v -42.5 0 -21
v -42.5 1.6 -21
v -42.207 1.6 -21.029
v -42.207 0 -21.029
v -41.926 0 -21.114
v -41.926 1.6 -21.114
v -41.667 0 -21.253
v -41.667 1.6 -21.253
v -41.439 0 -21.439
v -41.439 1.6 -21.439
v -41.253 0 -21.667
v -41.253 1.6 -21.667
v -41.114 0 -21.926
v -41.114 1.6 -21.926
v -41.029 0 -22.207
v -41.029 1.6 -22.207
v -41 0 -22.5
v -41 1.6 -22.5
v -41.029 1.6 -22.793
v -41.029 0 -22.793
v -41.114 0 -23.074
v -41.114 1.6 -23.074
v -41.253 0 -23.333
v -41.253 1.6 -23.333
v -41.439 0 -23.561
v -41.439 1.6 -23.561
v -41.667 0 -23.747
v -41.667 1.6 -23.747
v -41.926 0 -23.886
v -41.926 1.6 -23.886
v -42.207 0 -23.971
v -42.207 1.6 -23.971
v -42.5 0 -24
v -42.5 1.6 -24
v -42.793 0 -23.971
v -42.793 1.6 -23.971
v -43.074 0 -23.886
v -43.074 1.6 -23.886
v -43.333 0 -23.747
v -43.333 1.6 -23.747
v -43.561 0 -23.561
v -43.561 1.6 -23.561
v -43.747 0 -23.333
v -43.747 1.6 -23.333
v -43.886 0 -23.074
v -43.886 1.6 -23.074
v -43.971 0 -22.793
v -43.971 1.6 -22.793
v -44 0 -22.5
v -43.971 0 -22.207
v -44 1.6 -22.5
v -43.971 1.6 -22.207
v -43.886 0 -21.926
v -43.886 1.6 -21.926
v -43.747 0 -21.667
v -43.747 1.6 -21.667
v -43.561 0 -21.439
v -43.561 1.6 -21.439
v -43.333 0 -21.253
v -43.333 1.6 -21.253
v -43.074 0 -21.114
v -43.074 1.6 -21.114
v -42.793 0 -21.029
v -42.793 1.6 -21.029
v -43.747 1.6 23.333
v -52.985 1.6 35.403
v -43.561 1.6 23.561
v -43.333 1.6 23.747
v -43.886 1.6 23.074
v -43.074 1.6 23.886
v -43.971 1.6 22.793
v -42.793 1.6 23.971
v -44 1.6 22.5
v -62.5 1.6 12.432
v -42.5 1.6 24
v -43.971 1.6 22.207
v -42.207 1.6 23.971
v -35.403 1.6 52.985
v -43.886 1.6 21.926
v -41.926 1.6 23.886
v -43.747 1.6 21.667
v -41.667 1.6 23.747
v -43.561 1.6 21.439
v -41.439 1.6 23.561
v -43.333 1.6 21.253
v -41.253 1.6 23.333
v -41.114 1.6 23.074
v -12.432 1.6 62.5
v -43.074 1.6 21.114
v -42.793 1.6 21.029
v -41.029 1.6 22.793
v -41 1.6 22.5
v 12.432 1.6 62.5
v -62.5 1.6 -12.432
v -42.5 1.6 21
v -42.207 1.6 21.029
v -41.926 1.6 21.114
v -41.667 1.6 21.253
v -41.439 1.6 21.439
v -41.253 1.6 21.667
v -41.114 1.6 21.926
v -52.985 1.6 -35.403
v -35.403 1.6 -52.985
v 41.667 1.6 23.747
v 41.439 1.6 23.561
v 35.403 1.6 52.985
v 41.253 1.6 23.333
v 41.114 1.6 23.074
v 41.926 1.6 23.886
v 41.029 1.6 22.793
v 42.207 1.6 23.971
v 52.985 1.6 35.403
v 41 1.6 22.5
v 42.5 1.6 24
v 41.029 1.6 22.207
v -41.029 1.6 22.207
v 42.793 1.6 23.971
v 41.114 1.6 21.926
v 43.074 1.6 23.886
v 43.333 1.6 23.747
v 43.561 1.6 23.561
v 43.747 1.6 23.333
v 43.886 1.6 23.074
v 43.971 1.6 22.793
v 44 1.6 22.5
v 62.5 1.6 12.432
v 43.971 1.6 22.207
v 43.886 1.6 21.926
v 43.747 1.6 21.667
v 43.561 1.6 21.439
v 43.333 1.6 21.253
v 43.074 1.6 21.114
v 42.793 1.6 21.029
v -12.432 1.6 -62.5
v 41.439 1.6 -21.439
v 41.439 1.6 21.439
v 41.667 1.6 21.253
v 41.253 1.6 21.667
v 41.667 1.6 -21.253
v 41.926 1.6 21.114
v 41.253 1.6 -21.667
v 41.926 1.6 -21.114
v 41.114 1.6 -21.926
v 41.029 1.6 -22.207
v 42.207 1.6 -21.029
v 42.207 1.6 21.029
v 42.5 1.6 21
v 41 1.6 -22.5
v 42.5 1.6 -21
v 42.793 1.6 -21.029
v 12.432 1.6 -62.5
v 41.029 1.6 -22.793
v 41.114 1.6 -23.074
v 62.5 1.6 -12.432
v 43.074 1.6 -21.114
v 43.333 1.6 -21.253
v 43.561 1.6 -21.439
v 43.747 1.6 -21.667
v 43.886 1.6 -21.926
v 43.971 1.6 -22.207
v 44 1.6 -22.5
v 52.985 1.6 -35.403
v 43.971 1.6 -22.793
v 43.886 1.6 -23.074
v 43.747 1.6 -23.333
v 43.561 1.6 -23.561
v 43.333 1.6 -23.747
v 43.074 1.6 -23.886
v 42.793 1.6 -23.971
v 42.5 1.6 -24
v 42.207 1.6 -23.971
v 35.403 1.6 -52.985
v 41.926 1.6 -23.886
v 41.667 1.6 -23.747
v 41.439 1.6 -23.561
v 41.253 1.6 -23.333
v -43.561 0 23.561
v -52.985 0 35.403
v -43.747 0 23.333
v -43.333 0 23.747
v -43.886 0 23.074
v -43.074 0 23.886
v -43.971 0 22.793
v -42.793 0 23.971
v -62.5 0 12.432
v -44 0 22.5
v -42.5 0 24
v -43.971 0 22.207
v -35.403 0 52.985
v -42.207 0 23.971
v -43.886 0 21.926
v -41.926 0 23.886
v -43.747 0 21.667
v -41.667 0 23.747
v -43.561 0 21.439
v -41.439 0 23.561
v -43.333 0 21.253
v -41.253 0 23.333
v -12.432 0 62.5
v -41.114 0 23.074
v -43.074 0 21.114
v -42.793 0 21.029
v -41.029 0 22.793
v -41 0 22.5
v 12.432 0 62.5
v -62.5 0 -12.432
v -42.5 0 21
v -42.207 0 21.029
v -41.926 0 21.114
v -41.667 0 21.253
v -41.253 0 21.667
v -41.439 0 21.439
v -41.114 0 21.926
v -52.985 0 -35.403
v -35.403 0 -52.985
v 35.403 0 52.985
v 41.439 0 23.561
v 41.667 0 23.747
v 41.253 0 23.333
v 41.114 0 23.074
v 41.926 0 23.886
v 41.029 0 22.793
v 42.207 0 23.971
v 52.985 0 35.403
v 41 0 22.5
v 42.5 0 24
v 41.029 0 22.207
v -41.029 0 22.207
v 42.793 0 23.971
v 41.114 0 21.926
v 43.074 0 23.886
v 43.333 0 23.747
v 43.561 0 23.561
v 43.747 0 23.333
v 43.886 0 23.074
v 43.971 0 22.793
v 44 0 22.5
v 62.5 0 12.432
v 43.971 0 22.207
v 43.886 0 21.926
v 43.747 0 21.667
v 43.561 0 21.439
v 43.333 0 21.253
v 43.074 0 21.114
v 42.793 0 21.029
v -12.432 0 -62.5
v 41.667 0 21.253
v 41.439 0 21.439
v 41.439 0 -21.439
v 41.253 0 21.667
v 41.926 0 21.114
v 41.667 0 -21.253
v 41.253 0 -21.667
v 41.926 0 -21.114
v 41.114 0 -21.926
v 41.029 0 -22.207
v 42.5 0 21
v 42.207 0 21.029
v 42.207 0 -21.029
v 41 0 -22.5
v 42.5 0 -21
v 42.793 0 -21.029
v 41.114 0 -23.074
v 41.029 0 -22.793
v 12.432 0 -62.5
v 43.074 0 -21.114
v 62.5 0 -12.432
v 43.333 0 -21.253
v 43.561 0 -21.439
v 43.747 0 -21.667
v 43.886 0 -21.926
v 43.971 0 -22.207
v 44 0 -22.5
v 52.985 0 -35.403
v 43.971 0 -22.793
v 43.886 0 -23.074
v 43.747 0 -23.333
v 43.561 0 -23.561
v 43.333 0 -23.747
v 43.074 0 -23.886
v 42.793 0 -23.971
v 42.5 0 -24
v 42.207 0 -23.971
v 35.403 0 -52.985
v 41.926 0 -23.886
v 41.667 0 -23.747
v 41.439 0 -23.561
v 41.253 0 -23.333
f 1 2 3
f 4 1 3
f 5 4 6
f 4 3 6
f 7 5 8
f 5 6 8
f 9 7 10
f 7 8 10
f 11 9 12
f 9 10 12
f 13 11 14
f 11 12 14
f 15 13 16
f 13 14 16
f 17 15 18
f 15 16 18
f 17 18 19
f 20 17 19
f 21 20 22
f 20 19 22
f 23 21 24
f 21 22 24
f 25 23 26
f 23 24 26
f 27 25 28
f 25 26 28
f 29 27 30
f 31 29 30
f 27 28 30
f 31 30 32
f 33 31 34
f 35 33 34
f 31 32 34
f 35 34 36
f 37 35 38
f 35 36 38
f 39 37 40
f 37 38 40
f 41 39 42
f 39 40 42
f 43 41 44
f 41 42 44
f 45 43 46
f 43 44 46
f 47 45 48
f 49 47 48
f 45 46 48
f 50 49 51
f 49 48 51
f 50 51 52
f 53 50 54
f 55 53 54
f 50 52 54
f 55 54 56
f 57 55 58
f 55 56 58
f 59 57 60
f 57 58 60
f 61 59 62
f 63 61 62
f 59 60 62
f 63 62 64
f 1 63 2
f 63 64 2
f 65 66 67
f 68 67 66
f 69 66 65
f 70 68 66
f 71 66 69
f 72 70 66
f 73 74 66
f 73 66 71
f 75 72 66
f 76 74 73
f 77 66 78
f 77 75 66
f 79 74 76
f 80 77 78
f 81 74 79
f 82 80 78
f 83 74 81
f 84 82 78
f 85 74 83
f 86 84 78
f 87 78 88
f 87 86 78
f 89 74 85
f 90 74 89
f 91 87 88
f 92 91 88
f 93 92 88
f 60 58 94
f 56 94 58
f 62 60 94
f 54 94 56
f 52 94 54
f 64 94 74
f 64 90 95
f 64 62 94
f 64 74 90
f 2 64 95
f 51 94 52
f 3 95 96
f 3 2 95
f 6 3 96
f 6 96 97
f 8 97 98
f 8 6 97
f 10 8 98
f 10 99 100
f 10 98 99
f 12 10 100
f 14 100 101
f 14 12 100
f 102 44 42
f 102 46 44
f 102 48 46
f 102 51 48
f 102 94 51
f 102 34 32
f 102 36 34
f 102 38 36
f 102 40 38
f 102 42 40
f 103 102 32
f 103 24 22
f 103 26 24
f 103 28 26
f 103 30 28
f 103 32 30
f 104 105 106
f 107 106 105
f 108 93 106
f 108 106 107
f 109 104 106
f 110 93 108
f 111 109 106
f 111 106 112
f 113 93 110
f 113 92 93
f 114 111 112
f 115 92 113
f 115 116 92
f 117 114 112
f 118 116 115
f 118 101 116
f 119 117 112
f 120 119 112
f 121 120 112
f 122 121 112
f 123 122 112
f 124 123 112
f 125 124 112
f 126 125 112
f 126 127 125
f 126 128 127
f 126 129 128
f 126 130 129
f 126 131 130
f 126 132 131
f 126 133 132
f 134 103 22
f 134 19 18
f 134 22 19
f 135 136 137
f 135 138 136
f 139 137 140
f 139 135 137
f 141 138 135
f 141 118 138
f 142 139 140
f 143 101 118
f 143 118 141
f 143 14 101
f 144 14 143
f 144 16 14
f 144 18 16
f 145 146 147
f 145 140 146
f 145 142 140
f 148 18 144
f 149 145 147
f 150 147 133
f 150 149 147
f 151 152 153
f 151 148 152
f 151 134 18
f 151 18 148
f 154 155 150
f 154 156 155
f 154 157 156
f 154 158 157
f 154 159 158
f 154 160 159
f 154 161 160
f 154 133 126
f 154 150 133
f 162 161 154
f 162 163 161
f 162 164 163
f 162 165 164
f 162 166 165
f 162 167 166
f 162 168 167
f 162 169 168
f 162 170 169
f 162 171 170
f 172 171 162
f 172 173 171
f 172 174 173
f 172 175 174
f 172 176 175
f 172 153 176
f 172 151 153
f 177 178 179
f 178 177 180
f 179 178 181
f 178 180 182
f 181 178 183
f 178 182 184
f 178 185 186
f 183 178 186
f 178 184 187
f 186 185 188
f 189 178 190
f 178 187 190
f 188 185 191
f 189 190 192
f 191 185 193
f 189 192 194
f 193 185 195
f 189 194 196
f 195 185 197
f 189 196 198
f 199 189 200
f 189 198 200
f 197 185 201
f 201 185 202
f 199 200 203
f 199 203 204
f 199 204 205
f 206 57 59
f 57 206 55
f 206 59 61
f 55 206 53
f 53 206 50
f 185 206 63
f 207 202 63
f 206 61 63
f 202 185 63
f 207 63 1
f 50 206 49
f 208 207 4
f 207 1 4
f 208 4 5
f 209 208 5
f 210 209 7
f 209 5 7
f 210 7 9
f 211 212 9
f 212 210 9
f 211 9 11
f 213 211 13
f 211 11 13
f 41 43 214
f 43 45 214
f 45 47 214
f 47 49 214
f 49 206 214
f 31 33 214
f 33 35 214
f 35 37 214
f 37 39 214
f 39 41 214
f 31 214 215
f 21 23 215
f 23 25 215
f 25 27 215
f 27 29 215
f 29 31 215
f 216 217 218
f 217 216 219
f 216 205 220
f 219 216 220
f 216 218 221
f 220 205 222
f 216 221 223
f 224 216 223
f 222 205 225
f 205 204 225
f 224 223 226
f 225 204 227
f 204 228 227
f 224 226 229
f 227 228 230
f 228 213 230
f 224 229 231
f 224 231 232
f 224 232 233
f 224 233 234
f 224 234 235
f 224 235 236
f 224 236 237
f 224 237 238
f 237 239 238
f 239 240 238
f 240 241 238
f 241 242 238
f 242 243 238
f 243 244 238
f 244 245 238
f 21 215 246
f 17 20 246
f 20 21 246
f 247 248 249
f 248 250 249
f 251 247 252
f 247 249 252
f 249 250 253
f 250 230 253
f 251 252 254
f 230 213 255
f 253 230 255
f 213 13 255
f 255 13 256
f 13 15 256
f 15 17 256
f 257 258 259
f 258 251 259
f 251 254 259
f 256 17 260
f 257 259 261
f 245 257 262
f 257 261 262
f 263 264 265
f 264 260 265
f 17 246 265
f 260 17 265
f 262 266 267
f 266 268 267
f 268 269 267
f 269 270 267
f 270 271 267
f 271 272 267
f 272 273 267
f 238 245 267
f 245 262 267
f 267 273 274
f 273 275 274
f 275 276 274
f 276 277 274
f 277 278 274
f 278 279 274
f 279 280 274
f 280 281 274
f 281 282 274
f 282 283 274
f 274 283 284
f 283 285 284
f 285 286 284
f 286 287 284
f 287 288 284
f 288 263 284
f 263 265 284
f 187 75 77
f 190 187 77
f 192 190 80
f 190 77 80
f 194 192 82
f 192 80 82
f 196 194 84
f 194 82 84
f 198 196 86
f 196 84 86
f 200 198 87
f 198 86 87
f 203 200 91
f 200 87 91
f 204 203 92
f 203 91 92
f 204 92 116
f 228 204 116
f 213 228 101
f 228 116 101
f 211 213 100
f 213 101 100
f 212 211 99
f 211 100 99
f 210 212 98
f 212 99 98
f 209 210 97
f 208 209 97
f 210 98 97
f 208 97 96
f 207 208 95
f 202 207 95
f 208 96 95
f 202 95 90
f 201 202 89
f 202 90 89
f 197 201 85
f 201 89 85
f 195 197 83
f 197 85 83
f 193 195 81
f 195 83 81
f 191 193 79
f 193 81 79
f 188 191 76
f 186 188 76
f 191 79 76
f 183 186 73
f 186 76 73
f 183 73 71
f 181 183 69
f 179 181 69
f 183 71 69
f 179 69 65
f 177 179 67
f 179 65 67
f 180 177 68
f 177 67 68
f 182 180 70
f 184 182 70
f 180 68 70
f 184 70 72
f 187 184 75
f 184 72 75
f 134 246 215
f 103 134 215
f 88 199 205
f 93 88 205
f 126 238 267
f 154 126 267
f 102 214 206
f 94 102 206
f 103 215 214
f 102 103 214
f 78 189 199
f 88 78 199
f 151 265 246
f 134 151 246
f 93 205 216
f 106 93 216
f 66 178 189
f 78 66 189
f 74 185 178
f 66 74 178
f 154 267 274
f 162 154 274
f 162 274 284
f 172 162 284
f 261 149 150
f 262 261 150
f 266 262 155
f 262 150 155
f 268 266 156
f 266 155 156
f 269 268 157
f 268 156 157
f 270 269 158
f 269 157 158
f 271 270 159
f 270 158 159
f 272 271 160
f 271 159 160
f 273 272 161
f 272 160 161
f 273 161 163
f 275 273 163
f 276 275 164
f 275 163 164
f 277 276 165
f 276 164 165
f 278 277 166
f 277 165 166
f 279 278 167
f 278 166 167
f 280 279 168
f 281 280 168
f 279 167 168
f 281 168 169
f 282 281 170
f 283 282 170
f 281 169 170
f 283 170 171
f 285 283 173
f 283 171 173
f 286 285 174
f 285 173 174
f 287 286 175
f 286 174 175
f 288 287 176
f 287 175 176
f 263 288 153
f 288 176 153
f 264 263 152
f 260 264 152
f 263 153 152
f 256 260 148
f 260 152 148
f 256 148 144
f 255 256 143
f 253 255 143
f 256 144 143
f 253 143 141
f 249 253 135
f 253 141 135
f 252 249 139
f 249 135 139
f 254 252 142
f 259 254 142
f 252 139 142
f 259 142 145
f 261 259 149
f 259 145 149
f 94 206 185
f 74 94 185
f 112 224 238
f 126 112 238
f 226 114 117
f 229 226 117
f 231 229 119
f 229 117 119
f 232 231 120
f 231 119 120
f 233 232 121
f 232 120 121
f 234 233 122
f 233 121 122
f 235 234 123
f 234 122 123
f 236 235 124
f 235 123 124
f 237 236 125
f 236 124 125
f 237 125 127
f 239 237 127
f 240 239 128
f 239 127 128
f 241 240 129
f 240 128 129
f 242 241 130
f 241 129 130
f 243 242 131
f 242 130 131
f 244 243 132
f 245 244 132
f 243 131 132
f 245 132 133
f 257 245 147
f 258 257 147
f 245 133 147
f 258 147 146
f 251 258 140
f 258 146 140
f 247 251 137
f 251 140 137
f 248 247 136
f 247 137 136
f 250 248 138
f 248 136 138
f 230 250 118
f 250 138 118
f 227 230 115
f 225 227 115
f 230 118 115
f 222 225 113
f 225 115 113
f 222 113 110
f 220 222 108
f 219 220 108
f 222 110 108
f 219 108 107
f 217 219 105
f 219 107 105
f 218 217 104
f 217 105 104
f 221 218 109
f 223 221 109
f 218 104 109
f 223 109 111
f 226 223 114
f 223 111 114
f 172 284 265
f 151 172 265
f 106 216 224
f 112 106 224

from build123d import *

# Parameters (mm, degrees)
BOSS_EXTRUDE1_DEPTH = 1.6
SKETCH6_R           = 1.5
CUT_EXTRUDE2_DEPTH  = 1.6


with BuildPart() as part:
    # Sketch1 → Boss-Extrude1 (new body)
    with BuildSketch(Plane(origin=(0, 0, 0), x_dir=(1, 0, 0), z_dir=(0, 1, 0))):
        Polygon((62.5, 12.432022961), (52.984941564, 35.403406084), (35.403406084, 52.984941564), (12.432022961, 62.5), (-12.432022961, 62.5), (-35.403406084, 52.984941564), (-52.984941564, 35.403406084), (-62.5, 12.432022961), (-62.5, -12.432022961), (-52.984941564, -35.403406084), (-35.403406084, -52.984941564), (-12.432022961, -62.5), (12.432022961, -62.5), (35.403406084, -52.984941564), (52.984941564, -35.403406084), (62.5, -12.432022961), align=None)
    extrude(amount=BOSS_EXTRUDE1_DEPTH)

    # Sketch6 → Cut-Extrude2 (cut)
    with BuildSketch(Plane(origin=(0, 1.6, 0), x_dir=(1, 0, 0), z_dir=(0, 1, 0))):
        with Locations(Location((-42.5, 22.5, 0), (0, 0, 270))):
            Circle(SKETCH6_R)
        with Locations(Location((-42.5, -22.5, 0), (0, 0, 270))):
            Circle(SKETCH6_R)
        with Locations(Location((42.5, -22.5, 0), (0, 0, 270))):
            Circle(SKETCH6_R)
        with Locations(Location((42.5, 22.5, 0), (0, 0, 270))):
            Circle(SKETCH6_R)
    extrude(amount=-CUT_EXTRUDE2_DEPTH, mode=Mode.SUBTRACT)


solid = part.part
